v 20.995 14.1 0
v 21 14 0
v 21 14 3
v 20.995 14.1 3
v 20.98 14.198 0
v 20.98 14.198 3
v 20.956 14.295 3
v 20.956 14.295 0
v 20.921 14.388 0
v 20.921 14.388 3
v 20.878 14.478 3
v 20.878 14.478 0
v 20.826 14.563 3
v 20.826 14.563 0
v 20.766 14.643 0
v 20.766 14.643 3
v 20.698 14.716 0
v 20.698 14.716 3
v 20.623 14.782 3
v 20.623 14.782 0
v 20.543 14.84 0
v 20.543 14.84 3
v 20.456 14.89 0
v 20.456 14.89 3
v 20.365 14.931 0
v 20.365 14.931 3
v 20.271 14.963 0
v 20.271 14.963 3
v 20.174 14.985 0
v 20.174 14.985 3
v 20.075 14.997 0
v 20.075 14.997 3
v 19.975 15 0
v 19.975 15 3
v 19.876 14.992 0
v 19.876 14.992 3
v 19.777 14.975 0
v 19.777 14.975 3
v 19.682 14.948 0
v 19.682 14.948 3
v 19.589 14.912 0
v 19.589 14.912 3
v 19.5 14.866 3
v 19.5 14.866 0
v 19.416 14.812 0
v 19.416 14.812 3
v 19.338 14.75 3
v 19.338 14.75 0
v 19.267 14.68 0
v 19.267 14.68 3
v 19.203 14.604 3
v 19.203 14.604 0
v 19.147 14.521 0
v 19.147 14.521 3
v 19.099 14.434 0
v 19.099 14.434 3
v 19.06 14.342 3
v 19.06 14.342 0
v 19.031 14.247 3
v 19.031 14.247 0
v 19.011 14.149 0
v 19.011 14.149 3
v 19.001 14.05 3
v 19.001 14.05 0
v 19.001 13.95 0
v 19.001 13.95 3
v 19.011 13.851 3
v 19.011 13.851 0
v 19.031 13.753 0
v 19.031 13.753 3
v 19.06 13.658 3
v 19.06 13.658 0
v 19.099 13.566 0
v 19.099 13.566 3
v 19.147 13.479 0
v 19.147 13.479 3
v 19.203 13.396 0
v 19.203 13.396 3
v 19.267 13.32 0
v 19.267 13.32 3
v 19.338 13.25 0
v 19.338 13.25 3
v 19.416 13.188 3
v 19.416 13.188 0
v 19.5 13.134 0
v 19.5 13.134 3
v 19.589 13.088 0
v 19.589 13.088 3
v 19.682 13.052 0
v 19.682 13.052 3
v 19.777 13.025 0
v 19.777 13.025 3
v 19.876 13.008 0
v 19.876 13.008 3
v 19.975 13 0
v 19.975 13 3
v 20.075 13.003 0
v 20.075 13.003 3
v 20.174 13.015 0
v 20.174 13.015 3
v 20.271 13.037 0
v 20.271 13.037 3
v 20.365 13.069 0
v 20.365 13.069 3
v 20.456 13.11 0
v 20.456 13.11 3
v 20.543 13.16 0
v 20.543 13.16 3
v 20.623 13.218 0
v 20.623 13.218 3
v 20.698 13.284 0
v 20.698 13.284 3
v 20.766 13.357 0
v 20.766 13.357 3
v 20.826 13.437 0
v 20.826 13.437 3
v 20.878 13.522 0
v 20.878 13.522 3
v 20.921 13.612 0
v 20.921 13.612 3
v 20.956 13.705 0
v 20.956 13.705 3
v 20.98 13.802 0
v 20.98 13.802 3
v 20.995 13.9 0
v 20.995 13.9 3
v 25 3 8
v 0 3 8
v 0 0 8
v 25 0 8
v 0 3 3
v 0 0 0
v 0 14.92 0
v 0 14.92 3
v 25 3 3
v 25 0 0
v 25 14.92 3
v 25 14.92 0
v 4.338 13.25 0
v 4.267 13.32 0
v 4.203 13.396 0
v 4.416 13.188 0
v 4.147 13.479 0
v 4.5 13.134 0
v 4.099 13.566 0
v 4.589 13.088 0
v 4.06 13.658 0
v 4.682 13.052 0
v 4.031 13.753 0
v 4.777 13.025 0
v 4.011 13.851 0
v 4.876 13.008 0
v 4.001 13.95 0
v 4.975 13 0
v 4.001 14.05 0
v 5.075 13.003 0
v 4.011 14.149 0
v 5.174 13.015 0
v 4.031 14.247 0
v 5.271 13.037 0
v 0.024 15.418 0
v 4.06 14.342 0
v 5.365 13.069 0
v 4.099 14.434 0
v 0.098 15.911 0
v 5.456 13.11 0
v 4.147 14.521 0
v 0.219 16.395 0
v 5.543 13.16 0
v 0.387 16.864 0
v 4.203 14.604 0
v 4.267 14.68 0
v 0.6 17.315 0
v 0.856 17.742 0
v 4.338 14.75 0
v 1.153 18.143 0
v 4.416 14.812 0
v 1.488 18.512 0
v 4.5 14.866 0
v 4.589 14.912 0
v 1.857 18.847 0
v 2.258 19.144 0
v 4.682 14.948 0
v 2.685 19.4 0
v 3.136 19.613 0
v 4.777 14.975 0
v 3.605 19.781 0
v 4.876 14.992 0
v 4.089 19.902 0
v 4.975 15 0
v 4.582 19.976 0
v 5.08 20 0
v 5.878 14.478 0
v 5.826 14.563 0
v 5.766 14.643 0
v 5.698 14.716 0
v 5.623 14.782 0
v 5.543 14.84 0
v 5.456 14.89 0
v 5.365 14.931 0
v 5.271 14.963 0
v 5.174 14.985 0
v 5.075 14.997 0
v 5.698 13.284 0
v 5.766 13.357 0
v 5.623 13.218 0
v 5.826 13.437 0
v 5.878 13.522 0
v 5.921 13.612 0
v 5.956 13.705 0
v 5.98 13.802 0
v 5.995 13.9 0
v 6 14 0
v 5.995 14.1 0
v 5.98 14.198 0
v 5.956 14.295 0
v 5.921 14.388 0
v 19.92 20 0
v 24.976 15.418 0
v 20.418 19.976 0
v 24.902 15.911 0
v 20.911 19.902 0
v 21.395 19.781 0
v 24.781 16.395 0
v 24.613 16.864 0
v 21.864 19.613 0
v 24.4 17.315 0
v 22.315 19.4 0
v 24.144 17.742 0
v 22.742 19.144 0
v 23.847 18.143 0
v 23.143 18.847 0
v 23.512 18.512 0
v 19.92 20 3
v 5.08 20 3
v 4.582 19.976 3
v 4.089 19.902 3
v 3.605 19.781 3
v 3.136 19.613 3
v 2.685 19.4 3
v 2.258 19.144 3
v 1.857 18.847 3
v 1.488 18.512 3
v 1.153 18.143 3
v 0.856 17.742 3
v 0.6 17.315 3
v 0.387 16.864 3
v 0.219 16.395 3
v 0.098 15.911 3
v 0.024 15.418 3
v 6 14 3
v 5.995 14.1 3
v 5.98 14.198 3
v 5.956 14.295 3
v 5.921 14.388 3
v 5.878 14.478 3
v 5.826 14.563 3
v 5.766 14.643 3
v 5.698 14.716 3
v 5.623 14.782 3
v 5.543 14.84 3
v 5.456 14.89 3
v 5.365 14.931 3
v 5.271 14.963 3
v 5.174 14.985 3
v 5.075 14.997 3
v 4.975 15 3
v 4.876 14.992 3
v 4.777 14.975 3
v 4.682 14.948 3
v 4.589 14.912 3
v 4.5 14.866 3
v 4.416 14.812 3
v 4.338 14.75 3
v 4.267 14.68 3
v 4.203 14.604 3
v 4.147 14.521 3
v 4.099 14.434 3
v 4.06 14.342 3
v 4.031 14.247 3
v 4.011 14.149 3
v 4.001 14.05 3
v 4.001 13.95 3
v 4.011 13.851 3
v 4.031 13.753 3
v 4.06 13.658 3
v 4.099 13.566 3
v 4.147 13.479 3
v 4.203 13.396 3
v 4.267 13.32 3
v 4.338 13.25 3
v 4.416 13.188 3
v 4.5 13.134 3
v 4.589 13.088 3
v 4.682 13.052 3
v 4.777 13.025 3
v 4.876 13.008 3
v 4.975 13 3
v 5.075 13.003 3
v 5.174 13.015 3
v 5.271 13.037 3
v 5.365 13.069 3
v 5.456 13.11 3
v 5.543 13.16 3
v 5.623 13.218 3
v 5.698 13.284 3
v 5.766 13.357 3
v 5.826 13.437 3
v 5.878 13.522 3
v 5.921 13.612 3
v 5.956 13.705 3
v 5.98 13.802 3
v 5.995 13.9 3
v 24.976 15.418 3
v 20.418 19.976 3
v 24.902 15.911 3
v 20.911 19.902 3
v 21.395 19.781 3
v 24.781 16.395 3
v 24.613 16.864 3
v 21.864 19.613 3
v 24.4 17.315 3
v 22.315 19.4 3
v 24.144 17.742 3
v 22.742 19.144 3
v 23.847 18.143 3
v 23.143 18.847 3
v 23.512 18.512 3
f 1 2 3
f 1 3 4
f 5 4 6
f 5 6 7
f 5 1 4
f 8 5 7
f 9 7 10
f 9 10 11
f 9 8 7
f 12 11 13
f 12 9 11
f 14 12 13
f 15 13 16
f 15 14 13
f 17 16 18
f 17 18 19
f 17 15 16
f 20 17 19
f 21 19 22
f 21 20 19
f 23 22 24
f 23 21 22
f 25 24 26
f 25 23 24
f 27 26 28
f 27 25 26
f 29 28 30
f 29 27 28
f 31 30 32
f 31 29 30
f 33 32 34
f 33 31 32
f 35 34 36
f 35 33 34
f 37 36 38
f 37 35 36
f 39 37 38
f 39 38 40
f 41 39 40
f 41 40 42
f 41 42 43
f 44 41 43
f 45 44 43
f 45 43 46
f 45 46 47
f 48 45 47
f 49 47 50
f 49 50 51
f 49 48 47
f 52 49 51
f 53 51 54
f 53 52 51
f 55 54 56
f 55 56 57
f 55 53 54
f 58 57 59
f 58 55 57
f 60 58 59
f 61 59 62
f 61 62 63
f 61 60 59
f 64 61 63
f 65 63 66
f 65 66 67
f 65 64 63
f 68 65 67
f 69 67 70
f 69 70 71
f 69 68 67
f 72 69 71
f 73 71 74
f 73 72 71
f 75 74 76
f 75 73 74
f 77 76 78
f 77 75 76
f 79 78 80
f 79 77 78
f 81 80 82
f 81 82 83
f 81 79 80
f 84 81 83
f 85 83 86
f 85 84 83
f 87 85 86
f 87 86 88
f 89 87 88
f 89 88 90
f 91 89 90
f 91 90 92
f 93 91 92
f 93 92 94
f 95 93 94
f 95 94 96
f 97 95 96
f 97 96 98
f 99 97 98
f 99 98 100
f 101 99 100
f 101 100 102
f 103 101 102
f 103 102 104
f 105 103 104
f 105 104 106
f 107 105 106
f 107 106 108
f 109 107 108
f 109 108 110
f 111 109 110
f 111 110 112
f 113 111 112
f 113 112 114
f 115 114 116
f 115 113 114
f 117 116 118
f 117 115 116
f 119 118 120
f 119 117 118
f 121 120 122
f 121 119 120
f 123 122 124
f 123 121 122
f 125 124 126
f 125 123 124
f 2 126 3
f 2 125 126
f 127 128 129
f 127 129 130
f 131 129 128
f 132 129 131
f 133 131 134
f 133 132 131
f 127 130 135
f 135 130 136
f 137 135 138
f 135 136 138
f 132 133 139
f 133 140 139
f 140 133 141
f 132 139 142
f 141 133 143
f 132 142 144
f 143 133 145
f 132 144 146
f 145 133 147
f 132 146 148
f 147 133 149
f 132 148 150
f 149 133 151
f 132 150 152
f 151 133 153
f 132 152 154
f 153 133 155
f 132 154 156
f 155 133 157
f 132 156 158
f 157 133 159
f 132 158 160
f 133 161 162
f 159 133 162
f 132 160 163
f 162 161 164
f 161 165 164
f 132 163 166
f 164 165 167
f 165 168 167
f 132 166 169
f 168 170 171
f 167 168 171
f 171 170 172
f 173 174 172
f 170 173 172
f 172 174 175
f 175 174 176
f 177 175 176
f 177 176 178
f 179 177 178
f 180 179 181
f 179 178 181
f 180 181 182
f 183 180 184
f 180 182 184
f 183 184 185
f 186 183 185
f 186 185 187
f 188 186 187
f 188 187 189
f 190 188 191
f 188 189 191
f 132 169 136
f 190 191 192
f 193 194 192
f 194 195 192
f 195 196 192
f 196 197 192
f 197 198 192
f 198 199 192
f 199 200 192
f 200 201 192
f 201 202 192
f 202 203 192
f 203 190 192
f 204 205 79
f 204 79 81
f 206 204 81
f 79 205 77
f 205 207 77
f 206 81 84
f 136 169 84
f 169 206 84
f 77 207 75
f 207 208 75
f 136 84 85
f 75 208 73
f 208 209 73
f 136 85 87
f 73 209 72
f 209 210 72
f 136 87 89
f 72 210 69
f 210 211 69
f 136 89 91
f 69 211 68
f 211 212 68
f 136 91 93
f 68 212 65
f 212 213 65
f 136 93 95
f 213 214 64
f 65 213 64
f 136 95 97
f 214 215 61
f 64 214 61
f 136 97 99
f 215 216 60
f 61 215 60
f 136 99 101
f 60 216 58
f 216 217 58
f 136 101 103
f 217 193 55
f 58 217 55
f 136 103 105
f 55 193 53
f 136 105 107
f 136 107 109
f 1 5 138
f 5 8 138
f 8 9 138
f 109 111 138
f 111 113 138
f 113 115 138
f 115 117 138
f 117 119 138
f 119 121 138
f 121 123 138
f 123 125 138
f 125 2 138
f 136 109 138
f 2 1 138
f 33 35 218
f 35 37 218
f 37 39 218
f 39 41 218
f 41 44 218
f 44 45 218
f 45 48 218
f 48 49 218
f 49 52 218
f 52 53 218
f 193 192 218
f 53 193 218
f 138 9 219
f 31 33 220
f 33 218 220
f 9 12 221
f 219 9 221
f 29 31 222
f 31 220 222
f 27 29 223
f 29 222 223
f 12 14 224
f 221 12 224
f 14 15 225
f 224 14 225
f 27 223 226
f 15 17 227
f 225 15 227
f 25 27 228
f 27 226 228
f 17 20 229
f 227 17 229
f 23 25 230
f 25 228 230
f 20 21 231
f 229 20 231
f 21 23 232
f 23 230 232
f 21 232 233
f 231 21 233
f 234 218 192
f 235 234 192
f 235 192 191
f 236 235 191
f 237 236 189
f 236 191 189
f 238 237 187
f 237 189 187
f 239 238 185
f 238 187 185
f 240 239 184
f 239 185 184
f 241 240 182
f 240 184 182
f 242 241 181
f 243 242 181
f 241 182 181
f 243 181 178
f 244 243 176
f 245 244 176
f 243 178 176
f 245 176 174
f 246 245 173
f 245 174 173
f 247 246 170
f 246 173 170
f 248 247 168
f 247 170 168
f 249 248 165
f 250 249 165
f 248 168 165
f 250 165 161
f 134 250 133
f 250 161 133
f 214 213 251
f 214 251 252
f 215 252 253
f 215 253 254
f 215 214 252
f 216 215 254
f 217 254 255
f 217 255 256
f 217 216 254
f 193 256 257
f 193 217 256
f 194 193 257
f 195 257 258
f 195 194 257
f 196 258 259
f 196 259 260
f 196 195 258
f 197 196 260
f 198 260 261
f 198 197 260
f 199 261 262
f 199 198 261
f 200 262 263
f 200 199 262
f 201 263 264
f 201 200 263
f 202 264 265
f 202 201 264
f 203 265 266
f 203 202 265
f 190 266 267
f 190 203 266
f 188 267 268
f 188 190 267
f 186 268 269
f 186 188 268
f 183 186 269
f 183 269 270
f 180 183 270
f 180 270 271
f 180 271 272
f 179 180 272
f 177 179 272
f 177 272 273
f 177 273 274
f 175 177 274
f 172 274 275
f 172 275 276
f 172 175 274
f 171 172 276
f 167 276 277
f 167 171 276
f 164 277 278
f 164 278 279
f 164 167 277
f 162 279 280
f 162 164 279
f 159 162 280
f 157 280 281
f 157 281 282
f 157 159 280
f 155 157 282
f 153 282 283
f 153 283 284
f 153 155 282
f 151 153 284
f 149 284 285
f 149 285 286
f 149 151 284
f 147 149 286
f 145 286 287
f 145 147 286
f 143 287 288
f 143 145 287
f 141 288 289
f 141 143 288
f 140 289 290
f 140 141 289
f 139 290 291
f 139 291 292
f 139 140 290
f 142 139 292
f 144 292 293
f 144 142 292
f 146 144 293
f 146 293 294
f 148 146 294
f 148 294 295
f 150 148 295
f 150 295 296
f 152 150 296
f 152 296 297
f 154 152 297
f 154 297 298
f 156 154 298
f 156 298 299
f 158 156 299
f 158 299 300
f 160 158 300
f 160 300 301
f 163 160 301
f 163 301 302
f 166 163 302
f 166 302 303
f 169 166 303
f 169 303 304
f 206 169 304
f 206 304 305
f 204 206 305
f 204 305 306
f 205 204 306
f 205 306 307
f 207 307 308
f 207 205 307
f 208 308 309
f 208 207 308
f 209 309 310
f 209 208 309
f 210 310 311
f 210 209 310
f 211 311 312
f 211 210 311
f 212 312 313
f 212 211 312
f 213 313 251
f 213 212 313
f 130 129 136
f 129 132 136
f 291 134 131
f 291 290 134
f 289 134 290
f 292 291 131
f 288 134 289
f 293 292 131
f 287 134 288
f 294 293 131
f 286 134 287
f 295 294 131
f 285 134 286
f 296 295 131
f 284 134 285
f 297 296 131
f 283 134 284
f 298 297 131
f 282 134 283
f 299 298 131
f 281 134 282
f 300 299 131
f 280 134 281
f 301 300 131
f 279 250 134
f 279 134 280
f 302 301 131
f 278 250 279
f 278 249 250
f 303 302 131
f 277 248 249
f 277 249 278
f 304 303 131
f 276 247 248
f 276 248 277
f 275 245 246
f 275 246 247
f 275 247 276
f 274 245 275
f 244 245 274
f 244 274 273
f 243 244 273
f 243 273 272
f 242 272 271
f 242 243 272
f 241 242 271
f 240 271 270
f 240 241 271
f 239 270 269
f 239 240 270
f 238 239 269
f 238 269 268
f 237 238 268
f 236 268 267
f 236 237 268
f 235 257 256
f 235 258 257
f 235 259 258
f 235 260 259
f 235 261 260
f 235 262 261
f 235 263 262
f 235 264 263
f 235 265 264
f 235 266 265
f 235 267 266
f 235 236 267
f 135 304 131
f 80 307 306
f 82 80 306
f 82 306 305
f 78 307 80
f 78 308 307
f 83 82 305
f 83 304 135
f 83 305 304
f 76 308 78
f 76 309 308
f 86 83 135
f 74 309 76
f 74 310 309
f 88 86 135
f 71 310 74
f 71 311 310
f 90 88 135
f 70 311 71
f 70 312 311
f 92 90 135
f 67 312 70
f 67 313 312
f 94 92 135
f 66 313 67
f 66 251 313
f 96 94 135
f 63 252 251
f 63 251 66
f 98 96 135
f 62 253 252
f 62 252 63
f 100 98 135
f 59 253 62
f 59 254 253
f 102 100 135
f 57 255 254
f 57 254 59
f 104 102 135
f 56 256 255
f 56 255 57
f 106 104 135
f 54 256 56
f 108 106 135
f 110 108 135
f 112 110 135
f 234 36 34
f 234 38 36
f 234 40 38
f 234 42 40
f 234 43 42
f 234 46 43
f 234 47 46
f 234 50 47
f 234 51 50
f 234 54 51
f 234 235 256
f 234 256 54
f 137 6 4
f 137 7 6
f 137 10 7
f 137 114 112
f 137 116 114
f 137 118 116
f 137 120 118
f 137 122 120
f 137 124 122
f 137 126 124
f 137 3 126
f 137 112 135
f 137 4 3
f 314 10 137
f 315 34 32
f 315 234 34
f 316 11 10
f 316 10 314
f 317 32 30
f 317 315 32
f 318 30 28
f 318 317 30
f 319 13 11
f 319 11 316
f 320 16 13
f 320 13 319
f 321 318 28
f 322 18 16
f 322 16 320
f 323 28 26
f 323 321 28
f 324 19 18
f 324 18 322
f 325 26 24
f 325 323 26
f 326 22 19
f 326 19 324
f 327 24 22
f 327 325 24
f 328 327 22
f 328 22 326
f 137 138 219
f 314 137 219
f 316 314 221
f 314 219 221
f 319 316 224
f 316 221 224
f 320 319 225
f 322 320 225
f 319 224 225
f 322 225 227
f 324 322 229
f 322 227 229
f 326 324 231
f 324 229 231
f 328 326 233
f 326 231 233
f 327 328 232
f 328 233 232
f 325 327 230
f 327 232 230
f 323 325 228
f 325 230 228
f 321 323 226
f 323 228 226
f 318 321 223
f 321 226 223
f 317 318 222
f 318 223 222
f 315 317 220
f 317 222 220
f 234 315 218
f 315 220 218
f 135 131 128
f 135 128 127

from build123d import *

# Parameters (mm, degrees)
F0_R     = 1
F1_DEPTH = 3
F2_W     = 25
F2_H     = 3
F3_DEPTH = 5


with BuildPart() as f1:
    # F0 (on Top) → F1 (new body)
    with BuildSketch(Plane.XY):
        with BuildLine():
            Line((0, 14.92), (0, 0))
            Line((0, 0), (25, 0))
            Line((25, 0), (25, 14.92))
            ThreePointArc((25, 14.92), (23.512102, 18.512102), (19.92, 20))
            Line((19.92, 20), (5.08, 20))
            ThreePointArc((5.08, 20), (1.487898, 18.512102), (0, 14.92))
        make_face()
        with Locations((5, 14)):
            Circle(F0_R, mode=Mode.SUBTRACT)
        with Locations((20, 14)):
            Circle(F0_R, mode=Mode.SUBTRACT)
    extrude(amount=F1_DEPTH)

    # F2 (on face) → F3 (join)
    with BuildSketch(Plane.XY.offset(3)):
        with Locations((12.5, 1.5)):
            Rectangle(F2_W, F2_H)
    extrude(amount=F3_DEPTH)


solid = f1.part
